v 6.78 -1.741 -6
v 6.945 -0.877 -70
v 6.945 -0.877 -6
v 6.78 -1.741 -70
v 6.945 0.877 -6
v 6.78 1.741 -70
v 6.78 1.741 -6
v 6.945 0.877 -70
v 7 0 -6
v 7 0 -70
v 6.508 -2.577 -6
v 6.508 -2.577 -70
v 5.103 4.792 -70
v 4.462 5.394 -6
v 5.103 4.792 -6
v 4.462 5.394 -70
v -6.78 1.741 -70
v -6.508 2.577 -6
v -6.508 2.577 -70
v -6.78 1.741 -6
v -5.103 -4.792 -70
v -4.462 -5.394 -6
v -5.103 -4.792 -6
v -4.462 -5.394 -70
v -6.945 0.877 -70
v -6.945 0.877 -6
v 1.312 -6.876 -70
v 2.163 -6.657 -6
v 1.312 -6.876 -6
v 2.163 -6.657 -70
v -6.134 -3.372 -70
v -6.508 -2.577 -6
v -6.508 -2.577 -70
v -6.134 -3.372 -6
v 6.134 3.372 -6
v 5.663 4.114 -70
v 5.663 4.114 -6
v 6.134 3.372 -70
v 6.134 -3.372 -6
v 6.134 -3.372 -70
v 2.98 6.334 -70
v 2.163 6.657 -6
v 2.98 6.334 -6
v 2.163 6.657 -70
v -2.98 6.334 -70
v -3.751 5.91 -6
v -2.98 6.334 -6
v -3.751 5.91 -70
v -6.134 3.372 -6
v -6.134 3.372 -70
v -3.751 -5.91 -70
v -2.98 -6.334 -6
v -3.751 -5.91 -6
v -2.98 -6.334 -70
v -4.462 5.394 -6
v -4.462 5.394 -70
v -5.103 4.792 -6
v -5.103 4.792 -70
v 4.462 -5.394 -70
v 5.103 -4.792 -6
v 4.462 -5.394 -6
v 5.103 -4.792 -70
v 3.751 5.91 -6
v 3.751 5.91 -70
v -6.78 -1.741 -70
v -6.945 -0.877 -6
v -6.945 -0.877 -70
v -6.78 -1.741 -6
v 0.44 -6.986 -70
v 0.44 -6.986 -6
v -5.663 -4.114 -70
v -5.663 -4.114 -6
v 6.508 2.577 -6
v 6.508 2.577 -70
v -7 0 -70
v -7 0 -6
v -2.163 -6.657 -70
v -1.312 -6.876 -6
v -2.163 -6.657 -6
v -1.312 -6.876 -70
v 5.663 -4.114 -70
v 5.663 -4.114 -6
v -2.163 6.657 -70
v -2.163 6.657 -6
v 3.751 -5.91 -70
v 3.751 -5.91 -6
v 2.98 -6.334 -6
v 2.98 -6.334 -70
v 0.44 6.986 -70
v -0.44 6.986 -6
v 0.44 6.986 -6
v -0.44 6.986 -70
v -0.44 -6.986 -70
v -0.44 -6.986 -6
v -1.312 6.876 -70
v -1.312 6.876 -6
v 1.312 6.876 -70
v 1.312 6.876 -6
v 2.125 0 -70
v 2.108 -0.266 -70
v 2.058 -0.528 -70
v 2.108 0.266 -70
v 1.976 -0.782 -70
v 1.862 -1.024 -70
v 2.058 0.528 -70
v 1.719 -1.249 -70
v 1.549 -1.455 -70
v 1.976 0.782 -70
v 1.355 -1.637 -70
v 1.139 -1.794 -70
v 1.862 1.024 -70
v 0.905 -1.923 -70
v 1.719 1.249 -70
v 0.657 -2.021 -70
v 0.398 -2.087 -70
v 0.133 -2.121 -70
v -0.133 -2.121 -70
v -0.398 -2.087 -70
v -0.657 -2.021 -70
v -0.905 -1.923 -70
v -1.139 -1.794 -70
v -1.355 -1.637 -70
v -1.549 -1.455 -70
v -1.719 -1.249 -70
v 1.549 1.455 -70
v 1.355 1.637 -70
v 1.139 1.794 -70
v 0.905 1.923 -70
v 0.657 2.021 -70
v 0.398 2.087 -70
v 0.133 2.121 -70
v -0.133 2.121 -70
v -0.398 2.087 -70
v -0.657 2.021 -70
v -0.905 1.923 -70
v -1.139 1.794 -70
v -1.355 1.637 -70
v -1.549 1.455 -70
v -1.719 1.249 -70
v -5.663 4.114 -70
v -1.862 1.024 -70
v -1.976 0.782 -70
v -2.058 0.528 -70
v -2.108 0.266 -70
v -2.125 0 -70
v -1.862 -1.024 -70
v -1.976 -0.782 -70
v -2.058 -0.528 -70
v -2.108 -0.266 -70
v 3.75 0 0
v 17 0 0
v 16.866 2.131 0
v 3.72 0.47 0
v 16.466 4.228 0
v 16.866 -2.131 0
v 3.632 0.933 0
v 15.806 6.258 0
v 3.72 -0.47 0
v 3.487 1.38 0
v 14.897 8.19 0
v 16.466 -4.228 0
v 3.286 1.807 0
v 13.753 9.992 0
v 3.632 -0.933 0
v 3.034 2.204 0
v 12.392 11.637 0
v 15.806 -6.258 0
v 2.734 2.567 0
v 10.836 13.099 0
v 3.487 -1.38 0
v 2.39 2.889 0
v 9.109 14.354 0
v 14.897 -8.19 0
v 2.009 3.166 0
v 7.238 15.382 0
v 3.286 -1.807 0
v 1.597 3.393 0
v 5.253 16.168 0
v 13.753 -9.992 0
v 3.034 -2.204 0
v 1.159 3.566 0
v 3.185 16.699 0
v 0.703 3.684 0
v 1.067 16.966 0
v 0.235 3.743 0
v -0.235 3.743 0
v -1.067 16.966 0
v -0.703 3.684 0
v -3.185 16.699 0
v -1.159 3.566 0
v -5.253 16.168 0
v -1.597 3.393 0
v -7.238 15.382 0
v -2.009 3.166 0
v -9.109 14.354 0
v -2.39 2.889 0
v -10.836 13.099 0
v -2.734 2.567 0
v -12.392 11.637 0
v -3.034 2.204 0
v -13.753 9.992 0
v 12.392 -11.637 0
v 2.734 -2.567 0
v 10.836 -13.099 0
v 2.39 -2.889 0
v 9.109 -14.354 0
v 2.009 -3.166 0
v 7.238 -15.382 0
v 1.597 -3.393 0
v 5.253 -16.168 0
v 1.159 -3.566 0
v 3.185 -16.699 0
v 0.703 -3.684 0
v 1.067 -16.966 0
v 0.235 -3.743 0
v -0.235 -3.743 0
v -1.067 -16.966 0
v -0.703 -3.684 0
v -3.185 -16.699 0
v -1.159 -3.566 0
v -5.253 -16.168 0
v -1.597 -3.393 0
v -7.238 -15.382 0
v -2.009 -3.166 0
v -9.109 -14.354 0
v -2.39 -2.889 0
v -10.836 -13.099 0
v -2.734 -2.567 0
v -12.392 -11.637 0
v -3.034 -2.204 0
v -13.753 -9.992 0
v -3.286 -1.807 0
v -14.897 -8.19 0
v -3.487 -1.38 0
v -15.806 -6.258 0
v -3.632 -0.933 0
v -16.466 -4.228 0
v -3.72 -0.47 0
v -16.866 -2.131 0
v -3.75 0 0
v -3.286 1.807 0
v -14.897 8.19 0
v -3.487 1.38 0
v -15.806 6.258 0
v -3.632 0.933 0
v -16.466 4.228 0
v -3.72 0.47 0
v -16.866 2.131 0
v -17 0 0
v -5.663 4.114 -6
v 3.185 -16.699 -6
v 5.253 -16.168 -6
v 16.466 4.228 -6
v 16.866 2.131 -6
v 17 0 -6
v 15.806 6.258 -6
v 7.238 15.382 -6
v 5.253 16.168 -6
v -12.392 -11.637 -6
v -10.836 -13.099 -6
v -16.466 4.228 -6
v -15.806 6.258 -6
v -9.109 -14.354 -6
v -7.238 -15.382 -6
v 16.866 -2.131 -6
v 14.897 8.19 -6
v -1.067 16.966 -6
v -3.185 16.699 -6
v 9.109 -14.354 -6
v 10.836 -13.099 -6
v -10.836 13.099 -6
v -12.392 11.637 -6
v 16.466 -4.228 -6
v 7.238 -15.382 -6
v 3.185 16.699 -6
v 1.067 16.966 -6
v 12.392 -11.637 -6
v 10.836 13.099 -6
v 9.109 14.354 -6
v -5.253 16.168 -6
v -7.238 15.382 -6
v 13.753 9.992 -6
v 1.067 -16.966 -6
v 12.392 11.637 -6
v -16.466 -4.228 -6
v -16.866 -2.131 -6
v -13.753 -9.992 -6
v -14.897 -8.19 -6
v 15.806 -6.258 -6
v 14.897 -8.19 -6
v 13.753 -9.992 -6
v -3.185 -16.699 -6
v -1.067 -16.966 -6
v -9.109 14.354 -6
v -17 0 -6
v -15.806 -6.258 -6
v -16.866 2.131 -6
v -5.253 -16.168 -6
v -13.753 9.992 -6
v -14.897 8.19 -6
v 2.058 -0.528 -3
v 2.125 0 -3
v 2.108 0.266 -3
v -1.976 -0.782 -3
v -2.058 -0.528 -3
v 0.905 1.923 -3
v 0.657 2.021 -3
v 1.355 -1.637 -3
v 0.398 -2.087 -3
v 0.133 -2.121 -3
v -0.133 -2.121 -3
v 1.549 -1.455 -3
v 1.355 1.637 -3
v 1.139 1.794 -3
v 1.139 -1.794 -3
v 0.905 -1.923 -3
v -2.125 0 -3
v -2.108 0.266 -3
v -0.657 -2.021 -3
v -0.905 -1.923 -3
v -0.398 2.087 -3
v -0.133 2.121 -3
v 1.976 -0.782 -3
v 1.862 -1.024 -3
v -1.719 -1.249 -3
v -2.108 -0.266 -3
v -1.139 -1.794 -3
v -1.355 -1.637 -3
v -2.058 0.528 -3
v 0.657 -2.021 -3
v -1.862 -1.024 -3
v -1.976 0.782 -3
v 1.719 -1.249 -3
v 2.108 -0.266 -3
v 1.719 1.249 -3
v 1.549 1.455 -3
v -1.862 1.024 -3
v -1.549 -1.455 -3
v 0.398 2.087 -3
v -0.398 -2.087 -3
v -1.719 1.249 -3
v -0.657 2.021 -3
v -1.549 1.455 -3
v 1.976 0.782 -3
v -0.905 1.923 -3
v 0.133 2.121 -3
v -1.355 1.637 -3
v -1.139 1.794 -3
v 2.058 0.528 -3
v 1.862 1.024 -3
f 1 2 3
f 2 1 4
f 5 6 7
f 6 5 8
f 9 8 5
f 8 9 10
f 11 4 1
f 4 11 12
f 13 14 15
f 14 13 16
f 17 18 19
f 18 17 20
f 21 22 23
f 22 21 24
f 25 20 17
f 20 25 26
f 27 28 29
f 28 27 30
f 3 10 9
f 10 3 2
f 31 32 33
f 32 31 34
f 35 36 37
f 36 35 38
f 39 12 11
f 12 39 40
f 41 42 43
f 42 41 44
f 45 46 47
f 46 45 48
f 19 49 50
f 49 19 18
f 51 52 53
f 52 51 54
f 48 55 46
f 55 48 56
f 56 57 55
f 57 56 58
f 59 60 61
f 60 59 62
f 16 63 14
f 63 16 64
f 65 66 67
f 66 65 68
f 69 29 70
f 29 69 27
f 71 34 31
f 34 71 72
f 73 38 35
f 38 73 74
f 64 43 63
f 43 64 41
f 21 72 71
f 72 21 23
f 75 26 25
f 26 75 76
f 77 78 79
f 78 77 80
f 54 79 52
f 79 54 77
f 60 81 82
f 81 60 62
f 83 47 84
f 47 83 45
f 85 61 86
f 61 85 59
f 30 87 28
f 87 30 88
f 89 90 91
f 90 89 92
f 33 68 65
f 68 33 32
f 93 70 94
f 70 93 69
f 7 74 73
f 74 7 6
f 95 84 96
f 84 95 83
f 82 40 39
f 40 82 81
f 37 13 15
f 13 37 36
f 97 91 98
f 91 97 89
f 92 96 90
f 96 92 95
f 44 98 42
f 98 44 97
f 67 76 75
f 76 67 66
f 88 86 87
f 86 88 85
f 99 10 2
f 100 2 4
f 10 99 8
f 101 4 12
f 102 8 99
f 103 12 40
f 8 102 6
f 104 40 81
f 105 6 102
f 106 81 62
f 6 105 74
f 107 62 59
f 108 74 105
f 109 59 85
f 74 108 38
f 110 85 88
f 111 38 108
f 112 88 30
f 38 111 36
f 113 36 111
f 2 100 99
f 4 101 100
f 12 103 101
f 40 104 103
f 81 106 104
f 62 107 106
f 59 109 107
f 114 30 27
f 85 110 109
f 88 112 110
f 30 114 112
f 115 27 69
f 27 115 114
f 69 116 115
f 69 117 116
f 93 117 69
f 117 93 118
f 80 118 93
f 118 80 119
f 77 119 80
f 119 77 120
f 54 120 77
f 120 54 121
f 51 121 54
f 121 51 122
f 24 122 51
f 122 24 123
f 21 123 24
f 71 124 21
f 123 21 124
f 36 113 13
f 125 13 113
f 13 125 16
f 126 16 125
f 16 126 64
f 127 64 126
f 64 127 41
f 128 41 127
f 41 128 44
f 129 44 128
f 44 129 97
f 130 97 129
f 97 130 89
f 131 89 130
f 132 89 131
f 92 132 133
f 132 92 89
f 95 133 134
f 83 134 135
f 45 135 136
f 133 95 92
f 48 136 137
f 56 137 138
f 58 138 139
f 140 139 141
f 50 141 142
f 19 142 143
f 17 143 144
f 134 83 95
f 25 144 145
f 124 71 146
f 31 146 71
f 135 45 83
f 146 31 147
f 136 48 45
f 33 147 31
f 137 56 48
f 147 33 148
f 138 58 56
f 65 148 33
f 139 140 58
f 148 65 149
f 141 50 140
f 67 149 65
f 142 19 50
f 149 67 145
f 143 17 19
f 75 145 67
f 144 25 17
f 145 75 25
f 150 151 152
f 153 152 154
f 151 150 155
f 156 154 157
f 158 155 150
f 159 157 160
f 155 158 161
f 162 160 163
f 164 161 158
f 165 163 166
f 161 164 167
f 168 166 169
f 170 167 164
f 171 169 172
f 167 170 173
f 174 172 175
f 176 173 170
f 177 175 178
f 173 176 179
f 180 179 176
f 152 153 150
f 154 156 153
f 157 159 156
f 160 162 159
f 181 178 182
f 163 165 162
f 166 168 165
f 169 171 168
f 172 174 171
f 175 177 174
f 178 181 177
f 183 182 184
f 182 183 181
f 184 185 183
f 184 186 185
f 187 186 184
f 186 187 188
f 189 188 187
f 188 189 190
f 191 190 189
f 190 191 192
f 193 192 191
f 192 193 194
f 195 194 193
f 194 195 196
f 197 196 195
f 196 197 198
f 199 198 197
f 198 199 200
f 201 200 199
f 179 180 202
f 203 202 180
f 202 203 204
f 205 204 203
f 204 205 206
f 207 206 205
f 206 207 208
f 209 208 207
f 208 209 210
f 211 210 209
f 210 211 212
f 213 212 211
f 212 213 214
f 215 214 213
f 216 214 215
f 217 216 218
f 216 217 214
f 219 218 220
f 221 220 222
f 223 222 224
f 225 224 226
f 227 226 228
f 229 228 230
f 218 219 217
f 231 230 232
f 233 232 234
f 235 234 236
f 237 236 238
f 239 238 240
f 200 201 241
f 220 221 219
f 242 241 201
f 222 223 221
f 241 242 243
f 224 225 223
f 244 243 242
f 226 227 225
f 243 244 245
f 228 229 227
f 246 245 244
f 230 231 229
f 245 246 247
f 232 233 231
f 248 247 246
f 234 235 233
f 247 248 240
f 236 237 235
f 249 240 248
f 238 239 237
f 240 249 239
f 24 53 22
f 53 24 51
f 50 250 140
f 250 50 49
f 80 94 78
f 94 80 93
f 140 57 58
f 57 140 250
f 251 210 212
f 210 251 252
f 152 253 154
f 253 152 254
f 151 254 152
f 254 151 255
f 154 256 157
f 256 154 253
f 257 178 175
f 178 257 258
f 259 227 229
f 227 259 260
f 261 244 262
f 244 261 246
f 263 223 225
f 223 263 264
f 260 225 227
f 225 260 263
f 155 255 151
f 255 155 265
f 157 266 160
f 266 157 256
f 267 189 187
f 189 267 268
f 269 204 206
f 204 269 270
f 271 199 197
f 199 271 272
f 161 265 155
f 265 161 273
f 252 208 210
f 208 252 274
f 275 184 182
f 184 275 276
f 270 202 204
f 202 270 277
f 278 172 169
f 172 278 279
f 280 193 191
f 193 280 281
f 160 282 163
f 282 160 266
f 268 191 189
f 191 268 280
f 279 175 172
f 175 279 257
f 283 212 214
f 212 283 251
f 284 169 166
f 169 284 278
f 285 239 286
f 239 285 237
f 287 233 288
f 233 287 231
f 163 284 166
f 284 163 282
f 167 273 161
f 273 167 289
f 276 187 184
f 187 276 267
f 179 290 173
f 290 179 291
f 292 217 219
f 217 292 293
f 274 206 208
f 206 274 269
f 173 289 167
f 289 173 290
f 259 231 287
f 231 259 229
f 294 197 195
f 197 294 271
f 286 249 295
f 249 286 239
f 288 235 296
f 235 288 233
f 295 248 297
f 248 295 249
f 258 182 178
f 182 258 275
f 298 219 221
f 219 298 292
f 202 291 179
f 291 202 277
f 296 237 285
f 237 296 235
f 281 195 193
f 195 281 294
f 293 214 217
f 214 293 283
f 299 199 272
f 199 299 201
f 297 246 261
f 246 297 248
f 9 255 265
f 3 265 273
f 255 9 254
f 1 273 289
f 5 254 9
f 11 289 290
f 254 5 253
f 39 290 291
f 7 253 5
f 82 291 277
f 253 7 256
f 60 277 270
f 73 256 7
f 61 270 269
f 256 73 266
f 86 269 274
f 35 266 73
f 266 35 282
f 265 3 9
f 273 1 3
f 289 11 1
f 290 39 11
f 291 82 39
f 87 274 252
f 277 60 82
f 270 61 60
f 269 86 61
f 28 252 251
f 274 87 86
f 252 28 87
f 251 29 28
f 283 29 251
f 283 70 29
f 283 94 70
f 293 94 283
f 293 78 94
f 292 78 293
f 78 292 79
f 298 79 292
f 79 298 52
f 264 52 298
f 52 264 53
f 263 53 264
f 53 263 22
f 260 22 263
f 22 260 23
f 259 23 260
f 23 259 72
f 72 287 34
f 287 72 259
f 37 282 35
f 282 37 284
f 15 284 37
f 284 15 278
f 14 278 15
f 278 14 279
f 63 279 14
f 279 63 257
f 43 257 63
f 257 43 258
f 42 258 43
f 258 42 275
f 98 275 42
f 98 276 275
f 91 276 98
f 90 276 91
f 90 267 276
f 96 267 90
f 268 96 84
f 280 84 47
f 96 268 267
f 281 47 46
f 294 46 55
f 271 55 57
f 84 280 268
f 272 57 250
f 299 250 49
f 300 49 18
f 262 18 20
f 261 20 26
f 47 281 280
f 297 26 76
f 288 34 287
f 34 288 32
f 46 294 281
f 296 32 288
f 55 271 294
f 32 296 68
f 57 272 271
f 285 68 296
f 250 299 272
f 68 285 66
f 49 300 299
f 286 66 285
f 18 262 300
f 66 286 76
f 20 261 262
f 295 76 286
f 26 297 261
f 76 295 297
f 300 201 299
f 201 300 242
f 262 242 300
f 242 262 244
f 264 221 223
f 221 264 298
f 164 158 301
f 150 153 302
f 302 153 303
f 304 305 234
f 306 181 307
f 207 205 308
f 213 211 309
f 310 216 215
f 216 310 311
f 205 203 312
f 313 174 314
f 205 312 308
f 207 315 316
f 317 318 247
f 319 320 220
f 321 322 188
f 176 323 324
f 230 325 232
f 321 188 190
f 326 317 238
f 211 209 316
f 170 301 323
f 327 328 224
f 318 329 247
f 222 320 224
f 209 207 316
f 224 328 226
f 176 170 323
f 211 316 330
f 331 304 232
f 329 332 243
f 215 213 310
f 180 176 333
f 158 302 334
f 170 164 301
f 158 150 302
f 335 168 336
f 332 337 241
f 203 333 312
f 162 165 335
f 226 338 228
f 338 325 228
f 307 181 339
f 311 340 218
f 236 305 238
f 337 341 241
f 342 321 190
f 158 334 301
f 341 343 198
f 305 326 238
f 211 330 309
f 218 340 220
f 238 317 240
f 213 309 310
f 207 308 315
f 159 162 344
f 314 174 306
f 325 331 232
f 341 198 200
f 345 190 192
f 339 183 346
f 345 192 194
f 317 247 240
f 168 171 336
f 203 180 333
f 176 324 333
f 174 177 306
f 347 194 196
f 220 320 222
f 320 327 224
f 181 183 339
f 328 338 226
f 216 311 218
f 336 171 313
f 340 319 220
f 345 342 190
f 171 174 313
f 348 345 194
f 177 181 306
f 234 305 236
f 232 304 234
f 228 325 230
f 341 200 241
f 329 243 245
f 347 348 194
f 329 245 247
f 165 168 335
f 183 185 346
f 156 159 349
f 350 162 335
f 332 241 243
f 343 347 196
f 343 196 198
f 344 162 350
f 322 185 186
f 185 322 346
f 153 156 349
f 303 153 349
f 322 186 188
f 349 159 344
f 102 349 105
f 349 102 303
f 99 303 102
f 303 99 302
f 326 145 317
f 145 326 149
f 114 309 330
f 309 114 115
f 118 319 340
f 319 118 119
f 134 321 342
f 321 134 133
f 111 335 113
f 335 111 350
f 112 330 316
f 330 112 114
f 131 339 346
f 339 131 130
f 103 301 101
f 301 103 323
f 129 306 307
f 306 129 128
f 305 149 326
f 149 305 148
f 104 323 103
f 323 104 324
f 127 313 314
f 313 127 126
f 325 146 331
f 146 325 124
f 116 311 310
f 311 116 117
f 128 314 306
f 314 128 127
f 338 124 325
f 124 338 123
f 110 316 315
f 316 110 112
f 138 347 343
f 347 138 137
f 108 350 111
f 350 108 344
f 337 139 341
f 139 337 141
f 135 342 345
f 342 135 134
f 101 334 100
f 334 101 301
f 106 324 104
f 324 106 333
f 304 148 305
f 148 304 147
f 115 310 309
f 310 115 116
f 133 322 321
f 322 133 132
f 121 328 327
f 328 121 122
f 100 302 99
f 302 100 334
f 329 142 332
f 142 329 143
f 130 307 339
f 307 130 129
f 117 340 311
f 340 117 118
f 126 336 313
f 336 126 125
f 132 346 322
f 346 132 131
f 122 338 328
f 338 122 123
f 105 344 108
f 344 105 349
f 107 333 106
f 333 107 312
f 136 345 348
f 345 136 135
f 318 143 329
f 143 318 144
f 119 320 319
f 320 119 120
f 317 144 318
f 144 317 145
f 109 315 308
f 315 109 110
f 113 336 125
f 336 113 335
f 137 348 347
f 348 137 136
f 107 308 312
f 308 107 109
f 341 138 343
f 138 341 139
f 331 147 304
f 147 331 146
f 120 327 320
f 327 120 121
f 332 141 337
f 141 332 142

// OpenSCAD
$fn = 50;


difference() {
	union() {
		translate(v = [0, 0, -70.0000000000]) {
			cylinder(h = 70, r = 7.0000000000);
		}
		translate(v = [0, 0, -6.0000000000]) {
			cylinder(h = 6, r = 17.0000000000);
		}
	}
	union() {
		translate(v = [0, 0, 0]) {
			rotate(a = [0, 0, 0]) {
				difference() {
					union() {
						#translate(v = [0, 0, -70.0000000000]) {
							cylinder(h = 70, r = 2.0000000000);
						}
						#translate(v = [0, 0, -3]) {
							cylinder(h = 3, r1 = 2.1250000000, r2 = 3.7500000000);
						}
						#translate(v = [0, 0, -70.0000000000]) {
							cylinder(h = 70, r = 2.1250000000);
						}
						#translate(v = [0, 0, -70.0000000000]) {
							cylinder(h = 70, r = 2.0000000000);
						}
					}
					union();
				}
			}
		}
	}
}
